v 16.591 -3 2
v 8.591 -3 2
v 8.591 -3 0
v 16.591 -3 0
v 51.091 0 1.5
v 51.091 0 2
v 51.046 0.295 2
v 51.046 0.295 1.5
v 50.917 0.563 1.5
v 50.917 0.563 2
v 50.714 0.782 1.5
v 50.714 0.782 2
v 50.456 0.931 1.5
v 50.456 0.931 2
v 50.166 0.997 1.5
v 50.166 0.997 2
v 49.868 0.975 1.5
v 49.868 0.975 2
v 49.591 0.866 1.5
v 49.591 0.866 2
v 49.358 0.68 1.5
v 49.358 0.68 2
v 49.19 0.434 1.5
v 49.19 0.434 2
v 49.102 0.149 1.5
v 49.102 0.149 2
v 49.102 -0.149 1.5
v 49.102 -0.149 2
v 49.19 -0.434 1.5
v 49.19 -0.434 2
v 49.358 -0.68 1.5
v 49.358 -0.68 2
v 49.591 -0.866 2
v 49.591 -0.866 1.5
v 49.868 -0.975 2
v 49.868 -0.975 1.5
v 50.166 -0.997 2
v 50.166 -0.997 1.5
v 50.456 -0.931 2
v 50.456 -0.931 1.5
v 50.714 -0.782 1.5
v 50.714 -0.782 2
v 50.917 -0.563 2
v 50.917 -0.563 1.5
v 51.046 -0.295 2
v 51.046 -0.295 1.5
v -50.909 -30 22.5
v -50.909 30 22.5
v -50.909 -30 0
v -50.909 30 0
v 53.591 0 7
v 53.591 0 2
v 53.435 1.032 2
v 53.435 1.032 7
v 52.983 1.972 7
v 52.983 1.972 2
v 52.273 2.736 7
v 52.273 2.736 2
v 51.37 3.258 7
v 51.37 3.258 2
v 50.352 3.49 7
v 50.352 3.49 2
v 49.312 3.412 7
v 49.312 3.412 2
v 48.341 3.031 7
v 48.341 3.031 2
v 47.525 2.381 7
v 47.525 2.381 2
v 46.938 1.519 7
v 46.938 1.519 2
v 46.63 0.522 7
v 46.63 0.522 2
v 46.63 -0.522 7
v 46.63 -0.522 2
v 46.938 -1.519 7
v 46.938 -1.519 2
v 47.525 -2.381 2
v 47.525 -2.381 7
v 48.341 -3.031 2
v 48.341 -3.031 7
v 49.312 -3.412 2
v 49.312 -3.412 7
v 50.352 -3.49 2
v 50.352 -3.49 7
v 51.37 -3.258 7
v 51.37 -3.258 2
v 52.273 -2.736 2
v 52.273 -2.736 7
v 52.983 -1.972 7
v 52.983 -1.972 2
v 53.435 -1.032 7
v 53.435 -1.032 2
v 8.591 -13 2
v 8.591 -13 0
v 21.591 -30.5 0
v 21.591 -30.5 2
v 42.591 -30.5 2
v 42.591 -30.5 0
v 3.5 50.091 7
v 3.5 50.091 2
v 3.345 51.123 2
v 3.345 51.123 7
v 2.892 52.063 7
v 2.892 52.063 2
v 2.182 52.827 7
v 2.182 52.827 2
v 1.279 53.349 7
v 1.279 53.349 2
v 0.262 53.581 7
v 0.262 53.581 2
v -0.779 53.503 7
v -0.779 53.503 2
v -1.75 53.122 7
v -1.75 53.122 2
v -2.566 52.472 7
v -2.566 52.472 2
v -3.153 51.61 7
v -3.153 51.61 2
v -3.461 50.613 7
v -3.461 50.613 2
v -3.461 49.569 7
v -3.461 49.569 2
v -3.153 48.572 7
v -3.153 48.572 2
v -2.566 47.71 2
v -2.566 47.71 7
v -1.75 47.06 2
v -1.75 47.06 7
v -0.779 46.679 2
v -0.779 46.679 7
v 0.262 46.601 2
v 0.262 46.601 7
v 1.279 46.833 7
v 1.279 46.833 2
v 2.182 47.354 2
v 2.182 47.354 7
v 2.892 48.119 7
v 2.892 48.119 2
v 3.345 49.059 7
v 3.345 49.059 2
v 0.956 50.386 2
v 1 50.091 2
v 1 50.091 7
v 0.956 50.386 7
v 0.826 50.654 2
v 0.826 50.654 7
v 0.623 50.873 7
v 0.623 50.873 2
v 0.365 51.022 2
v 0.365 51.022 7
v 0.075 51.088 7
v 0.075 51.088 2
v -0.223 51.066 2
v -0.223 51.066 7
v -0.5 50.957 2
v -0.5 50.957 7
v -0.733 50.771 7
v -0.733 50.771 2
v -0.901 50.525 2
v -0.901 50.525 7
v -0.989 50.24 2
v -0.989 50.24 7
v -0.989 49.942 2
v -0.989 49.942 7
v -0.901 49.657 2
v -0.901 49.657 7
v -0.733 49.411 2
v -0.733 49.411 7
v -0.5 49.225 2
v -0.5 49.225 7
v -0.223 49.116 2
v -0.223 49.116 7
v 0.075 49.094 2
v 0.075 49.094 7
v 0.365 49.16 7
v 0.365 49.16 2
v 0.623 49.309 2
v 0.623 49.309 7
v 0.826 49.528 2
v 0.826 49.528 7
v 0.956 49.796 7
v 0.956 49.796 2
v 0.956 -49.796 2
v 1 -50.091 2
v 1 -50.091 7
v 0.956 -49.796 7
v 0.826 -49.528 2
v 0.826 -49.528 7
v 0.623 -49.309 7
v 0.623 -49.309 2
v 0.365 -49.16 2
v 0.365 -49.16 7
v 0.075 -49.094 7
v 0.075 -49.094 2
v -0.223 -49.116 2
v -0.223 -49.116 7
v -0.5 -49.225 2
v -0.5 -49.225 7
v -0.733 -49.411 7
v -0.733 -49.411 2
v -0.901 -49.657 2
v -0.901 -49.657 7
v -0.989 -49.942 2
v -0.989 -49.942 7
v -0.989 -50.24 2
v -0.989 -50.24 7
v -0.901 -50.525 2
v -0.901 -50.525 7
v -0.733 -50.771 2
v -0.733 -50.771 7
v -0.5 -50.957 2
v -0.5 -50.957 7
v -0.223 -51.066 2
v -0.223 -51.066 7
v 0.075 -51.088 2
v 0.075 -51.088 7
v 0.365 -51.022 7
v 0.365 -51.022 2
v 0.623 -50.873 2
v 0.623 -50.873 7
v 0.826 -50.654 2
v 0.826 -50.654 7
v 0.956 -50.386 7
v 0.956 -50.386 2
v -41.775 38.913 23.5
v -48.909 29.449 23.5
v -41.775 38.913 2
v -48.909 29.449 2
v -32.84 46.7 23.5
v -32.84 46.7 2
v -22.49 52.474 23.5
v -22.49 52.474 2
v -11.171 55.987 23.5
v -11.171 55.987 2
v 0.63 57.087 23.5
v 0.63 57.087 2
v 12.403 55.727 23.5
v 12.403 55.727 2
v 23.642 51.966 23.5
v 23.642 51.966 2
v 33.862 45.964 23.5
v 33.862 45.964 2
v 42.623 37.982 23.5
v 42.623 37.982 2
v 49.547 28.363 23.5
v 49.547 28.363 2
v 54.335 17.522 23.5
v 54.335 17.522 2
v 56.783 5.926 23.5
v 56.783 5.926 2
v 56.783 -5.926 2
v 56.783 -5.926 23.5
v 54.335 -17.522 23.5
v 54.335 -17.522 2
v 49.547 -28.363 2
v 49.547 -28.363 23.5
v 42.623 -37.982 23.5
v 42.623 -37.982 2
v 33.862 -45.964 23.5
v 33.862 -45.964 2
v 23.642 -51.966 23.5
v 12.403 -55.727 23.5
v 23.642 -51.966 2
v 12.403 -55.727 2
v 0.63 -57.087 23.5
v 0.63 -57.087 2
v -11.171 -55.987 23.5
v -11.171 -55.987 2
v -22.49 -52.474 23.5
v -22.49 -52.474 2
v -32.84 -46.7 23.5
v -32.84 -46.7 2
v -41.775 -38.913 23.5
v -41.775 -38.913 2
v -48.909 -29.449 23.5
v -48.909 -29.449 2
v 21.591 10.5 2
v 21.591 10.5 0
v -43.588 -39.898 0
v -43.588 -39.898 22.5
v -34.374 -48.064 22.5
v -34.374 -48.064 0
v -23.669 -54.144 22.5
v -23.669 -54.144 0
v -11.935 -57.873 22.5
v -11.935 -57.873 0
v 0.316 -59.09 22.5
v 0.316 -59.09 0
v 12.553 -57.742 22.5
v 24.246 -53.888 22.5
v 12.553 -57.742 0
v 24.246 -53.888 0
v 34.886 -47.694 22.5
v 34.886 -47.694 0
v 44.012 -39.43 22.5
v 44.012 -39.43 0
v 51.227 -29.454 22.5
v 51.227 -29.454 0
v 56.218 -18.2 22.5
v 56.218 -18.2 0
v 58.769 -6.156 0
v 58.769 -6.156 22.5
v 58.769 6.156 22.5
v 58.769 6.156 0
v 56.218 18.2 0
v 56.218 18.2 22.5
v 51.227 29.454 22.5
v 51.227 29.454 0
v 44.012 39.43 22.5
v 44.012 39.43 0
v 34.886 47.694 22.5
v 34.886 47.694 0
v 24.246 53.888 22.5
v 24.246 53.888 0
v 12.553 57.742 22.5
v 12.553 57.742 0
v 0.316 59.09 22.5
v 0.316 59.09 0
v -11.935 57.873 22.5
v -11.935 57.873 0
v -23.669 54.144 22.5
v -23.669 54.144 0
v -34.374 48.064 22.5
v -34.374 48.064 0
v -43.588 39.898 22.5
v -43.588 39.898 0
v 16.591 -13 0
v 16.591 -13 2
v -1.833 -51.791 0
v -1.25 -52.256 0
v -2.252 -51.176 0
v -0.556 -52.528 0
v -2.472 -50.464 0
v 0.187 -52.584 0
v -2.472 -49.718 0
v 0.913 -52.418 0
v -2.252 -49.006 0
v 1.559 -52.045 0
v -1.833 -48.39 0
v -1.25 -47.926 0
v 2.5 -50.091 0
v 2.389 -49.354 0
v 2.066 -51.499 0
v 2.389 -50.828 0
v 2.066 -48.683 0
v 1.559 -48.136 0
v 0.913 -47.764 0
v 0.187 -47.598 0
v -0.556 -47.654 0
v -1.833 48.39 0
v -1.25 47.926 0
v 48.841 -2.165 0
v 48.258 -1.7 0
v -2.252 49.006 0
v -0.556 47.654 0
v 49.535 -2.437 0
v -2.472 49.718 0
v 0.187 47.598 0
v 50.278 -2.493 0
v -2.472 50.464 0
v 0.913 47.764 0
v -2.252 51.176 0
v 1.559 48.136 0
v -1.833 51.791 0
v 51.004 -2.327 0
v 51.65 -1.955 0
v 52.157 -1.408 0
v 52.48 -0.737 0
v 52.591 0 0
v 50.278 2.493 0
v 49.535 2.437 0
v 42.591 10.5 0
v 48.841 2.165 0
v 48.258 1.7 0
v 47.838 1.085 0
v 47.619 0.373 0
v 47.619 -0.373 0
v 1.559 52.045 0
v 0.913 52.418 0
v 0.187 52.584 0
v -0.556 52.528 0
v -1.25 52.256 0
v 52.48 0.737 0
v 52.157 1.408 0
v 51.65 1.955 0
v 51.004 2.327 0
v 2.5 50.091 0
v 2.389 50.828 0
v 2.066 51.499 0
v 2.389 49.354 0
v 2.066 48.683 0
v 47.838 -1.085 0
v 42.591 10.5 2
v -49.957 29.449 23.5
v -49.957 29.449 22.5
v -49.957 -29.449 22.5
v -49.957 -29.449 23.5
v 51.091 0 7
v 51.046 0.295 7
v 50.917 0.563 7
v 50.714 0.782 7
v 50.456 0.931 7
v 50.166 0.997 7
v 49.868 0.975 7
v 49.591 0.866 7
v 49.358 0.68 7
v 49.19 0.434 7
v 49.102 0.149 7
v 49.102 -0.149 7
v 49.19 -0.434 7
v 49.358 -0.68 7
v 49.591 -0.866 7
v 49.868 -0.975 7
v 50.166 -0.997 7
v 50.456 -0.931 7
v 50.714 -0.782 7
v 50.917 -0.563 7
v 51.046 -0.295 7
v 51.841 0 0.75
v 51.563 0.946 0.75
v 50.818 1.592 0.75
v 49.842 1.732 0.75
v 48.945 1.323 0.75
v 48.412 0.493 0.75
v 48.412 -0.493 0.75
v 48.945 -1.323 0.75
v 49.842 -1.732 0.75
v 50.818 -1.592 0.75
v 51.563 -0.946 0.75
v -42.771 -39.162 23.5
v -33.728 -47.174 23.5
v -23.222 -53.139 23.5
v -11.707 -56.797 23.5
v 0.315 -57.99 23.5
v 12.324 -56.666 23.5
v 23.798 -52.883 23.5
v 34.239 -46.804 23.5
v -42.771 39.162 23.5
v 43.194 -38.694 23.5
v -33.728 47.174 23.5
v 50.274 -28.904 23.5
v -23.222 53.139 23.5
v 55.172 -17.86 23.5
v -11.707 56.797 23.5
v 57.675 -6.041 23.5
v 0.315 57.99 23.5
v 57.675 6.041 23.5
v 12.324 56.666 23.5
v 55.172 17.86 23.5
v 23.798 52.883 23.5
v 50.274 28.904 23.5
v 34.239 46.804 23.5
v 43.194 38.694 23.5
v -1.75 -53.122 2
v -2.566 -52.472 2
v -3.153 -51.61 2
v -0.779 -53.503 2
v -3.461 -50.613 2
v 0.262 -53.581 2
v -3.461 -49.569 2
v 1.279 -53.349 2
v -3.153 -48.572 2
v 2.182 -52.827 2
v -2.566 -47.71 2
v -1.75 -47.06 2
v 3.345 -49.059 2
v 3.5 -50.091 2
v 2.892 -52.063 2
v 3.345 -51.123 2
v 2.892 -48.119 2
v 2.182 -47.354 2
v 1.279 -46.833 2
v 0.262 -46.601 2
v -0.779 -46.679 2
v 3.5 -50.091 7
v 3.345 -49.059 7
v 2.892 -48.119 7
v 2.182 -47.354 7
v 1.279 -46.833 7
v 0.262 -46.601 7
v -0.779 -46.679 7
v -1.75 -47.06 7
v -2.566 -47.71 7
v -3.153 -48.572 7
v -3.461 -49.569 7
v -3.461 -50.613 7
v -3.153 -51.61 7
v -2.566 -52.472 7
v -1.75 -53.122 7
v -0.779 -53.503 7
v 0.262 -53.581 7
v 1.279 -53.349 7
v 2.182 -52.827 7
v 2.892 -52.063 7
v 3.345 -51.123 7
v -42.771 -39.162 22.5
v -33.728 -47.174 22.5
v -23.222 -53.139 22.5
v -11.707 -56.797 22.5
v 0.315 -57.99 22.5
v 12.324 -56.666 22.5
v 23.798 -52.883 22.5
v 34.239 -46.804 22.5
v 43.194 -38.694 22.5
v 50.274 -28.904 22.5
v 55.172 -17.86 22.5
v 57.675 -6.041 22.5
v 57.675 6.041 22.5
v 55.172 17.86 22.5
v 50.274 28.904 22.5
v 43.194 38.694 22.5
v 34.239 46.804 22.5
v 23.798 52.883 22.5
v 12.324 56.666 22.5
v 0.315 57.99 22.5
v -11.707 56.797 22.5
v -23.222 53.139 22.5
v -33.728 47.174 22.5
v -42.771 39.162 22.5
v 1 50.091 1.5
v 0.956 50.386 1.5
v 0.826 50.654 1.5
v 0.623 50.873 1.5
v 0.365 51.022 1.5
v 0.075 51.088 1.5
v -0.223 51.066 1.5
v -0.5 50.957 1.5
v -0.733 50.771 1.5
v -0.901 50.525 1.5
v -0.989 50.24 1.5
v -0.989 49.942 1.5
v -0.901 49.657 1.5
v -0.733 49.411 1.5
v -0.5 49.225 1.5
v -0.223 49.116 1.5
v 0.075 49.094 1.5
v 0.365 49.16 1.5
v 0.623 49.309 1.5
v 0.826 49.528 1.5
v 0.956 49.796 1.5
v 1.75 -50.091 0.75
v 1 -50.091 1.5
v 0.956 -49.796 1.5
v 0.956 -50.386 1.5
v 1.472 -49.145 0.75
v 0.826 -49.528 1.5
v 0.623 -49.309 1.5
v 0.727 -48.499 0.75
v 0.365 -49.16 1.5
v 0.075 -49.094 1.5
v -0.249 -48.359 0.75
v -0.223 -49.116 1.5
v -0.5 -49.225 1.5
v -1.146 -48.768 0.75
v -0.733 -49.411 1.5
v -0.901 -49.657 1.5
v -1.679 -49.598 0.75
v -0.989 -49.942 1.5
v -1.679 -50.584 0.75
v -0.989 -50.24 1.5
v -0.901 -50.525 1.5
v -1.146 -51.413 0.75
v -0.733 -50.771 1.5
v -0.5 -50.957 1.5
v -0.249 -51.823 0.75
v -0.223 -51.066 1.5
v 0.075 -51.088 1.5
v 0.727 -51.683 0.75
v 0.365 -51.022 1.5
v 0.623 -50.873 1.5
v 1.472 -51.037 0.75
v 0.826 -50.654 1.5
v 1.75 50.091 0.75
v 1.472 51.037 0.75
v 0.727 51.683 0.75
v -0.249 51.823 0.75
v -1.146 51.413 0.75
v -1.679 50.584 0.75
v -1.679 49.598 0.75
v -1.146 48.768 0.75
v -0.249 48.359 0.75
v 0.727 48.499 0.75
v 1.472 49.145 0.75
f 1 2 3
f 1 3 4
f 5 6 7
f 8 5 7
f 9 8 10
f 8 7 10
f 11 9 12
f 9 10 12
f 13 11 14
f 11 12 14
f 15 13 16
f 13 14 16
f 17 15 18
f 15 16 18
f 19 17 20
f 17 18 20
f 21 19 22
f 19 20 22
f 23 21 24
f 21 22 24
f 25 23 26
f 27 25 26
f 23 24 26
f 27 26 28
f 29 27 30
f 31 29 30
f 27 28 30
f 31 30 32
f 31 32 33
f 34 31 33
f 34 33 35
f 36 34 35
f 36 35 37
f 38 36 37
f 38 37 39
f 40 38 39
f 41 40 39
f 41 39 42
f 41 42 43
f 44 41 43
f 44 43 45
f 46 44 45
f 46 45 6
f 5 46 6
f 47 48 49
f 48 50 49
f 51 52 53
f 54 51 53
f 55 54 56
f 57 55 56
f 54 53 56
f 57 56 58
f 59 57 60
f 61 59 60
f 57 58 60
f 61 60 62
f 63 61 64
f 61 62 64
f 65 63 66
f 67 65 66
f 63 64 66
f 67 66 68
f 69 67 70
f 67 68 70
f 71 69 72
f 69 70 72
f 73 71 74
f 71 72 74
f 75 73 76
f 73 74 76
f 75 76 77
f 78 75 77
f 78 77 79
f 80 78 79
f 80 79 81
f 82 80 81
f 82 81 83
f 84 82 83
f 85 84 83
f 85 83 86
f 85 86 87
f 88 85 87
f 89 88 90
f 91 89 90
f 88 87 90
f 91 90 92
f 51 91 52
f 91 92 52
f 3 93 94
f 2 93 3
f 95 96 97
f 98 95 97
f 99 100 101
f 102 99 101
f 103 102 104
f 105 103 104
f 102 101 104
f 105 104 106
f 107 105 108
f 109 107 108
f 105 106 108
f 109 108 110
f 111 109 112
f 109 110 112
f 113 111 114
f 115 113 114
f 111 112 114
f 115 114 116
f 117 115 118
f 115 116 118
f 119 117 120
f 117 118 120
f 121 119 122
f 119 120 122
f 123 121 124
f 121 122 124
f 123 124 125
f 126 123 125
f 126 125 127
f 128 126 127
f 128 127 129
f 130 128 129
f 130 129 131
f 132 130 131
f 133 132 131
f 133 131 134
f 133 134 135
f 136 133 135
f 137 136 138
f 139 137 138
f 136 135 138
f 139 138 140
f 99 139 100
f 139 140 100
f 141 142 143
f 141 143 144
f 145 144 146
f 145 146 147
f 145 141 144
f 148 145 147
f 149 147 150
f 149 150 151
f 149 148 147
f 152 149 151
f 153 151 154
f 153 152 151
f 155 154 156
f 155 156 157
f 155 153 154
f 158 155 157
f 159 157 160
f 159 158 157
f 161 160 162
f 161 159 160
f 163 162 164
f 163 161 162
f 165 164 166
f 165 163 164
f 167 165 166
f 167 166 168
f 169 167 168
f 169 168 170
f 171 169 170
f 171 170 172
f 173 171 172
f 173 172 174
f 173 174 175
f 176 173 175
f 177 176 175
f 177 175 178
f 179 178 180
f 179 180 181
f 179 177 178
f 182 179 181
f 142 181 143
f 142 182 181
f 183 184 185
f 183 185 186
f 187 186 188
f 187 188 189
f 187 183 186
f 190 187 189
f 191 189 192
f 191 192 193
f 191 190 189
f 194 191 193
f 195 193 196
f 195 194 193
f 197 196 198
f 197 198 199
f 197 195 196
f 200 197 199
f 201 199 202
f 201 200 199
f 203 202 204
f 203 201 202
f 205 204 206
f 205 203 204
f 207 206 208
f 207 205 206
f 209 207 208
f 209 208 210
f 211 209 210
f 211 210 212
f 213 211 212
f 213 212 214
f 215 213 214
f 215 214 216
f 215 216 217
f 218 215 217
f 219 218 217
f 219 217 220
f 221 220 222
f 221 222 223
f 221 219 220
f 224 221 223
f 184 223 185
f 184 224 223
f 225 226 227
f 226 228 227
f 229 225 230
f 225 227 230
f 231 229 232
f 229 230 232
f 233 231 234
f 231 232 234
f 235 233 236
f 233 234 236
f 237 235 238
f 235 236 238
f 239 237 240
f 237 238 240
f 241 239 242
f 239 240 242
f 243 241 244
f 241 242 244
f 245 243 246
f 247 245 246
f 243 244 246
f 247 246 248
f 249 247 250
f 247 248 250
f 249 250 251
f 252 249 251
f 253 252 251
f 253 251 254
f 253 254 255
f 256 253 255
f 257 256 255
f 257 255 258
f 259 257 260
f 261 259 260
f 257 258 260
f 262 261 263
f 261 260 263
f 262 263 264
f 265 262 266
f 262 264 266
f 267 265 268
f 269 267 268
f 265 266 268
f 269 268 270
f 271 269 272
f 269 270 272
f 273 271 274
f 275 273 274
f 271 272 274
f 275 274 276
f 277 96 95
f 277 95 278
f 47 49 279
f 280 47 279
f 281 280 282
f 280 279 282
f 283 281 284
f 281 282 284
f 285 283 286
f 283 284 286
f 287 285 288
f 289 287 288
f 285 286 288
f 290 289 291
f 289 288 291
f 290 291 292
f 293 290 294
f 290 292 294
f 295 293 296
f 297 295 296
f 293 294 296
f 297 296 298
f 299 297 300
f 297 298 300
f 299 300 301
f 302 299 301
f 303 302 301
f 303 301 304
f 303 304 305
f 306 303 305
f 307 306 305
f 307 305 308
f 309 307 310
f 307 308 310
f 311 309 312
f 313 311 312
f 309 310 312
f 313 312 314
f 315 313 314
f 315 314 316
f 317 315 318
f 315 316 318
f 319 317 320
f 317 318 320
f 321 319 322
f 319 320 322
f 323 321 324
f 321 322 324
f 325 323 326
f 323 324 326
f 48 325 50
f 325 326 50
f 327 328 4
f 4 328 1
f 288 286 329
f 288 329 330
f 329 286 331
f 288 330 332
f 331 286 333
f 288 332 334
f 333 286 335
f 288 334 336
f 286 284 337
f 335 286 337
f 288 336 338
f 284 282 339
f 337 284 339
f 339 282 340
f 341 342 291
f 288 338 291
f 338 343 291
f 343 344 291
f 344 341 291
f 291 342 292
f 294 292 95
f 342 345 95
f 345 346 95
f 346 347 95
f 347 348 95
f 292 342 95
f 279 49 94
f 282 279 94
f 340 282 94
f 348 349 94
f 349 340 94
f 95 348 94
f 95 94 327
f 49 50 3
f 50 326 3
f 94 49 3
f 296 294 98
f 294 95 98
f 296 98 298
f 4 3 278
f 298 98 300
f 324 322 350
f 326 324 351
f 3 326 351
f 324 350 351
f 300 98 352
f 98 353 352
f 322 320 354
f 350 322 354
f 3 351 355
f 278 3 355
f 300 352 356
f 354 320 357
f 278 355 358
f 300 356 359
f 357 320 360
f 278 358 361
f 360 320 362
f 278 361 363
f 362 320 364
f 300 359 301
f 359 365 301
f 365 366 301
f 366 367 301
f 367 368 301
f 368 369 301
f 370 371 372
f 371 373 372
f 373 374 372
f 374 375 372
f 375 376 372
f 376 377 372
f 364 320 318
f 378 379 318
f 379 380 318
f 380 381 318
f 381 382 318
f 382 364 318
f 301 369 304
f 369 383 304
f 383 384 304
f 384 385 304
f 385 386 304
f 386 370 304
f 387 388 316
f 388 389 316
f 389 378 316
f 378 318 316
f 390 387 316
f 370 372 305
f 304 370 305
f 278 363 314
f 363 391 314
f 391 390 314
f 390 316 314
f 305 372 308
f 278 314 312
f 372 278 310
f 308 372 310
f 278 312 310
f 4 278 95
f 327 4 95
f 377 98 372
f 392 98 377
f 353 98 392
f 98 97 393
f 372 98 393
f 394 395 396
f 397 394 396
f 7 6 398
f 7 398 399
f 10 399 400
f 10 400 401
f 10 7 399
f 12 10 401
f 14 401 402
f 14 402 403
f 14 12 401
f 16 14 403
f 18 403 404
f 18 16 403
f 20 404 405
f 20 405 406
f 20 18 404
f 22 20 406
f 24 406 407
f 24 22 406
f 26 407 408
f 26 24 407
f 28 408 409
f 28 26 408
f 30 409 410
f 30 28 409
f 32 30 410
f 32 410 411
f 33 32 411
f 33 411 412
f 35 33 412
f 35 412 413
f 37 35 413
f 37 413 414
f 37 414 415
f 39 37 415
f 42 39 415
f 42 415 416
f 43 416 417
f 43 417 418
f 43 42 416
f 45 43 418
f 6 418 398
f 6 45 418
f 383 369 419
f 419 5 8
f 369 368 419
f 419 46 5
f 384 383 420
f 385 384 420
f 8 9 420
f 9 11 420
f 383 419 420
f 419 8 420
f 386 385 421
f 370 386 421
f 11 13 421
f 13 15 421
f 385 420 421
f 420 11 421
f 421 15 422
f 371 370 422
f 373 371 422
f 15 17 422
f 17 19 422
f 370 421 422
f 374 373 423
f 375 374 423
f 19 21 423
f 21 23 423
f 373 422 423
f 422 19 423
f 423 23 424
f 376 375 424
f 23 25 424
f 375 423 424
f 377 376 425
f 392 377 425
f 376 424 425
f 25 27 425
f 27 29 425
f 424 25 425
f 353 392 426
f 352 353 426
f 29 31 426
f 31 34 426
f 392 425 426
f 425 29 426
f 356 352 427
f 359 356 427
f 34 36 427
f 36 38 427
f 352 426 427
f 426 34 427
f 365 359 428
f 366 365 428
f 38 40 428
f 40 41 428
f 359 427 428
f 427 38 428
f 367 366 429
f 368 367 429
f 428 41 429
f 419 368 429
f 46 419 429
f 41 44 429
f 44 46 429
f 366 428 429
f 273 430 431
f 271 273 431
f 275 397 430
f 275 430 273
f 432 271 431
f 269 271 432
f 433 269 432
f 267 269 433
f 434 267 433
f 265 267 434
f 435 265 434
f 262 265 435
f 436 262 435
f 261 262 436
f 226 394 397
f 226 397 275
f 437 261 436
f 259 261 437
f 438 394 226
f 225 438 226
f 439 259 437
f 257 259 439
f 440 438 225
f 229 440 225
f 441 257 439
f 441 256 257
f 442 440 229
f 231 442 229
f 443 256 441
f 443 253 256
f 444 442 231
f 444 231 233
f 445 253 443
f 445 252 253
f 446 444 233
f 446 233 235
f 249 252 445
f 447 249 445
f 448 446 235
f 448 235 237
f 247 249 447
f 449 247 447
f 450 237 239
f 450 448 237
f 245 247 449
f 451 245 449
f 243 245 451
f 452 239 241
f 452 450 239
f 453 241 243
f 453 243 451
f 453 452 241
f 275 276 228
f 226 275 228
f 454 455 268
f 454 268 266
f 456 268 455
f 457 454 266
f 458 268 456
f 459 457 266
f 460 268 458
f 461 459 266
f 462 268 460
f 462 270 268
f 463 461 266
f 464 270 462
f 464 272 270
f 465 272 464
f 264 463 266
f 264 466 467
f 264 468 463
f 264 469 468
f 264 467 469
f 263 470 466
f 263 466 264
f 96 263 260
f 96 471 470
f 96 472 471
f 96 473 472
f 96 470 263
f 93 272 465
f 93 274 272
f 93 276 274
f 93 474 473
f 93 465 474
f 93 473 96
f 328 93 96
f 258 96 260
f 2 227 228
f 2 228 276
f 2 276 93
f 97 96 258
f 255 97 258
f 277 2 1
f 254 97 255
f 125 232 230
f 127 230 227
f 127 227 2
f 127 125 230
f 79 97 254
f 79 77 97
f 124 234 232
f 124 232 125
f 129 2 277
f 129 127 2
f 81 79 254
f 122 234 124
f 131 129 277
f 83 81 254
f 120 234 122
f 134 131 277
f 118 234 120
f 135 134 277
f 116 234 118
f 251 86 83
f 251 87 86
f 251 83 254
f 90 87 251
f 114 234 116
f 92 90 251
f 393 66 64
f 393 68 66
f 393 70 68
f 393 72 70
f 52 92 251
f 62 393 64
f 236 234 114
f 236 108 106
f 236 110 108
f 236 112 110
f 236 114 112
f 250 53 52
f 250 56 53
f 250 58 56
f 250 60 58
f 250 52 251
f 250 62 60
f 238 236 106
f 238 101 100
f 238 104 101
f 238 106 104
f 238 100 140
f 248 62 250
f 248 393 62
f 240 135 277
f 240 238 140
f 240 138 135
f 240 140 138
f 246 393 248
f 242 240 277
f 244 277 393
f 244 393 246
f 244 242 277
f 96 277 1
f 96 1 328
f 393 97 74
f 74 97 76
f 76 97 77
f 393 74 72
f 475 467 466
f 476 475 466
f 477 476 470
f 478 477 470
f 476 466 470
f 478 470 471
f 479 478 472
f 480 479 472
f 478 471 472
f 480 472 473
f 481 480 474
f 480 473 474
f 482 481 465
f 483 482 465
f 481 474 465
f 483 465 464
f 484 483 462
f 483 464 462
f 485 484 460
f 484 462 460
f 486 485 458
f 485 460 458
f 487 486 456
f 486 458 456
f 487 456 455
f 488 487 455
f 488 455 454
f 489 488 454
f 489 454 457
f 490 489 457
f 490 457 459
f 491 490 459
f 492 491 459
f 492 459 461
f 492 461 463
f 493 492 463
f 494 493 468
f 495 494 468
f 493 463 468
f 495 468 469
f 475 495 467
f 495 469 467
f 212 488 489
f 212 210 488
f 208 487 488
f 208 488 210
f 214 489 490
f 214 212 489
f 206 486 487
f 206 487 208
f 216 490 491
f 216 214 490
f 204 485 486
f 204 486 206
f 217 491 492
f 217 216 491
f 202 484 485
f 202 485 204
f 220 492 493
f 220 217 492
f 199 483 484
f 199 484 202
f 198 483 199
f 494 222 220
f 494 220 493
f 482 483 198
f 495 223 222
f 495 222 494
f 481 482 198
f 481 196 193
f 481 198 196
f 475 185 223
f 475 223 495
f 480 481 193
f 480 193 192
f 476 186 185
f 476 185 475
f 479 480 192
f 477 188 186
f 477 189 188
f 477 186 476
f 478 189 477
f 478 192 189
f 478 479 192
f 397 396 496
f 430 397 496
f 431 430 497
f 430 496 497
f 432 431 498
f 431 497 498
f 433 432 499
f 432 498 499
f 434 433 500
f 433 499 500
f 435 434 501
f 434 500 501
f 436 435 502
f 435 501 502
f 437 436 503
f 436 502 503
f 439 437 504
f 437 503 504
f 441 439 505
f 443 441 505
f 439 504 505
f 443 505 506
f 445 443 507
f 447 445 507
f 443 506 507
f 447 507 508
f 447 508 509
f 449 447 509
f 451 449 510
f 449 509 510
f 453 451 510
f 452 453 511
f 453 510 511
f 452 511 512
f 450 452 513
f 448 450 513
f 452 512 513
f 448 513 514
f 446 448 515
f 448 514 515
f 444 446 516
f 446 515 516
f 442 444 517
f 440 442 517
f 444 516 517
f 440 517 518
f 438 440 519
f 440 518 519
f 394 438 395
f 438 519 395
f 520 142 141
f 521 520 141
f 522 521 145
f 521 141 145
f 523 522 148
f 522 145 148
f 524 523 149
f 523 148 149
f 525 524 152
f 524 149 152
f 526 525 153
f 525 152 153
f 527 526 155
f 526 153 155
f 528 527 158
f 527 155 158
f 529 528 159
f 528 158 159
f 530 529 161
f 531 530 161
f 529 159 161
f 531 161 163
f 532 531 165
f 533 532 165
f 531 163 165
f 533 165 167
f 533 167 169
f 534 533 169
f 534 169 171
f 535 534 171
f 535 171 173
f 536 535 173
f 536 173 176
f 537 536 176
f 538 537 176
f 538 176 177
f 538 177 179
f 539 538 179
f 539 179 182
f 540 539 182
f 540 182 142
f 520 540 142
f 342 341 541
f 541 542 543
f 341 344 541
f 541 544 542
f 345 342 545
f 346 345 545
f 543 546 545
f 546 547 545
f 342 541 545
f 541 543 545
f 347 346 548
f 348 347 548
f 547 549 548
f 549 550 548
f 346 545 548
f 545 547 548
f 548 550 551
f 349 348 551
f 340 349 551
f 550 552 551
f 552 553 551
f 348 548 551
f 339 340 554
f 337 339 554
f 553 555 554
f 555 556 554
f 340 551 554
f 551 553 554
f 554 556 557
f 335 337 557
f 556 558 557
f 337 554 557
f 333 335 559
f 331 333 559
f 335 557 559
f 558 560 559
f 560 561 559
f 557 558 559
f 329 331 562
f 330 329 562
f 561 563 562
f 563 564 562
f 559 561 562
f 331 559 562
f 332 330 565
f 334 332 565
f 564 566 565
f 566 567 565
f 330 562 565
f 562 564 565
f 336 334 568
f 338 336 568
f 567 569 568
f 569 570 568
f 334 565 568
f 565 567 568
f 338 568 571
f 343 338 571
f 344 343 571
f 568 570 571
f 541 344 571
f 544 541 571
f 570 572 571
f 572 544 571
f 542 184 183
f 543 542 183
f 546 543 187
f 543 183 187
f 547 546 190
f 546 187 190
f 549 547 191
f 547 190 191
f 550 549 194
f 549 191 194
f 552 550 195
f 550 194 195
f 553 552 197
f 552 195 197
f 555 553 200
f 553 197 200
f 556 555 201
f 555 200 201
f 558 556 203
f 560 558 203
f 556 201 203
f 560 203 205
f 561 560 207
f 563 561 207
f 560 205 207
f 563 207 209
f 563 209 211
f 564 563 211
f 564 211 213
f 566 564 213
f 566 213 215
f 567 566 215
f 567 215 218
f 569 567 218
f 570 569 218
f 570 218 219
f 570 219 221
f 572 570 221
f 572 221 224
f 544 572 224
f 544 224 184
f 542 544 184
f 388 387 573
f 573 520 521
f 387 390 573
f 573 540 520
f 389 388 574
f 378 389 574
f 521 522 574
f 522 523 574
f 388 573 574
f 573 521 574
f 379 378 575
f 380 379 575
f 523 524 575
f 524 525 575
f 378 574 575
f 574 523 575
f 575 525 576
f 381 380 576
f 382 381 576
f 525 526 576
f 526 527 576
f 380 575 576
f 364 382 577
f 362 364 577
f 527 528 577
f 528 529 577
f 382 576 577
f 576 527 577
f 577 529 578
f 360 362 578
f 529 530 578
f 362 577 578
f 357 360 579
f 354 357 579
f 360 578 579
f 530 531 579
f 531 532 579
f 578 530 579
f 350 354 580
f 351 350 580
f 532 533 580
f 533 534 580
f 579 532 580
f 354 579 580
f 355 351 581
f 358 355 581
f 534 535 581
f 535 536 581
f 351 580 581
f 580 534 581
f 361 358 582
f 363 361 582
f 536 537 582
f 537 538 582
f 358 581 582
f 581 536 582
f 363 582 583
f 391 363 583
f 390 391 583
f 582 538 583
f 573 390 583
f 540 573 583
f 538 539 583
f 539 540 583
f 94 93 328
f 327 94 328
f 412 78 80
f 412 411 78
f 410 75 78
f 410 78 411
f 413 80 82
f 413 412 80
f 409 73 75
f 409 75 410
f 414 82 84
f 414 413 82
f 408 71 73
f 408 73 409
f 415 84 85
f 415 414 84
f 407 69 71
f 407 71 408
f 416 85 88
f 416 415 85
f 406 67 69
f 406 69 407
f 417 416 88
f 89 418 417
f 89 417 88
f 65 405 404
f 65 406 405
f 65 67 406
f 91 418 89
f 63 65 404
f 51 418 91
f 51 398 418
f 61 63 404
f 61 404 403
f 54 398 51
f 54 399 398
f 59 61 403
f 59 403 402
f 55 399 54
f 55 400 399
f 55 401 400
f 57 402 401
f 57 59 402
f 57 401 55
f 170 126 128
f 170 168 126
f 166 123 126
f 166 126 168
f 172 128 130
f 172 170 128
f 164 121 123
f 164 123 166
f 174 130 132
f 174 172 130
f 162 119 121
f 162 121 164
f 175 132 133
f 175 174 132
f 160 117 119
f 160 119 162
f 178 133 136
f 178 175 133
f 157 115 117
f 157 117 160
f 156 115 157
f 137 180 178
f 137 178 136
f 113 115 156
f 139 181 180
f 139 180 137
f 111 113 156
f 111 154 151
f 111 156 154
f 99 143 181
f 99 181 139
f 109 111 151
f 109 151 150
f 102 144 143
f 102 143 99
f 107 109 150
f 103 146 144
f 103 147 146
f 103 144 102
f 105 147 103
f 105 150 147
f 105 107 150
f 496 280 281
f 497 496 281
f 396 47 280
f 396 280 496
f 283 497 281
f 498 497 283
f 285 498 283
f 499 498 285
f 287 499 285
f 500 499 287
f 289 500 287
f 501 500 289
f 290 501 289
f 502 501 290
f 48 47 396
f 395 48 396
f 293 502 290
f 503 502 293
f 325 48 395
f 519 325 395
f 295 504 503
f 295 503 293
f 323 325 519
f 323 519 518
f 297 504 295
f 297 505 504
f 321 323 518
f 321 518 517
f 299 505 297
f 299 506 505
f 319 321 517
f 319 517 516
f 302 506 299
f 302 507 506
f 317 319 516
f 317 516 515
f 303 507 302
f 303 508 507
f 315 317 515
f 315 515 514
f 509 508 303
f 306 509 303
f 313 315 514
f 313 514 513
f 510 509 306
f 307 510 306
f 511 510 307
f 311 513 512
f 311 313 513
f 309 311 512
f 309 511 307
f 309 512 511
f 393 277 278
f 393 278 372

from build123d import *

# Parameters (mm, degrees)
F1_DEPTH  = 2
F3_R      = 3.5
F3_R_2    = 1
F5_DEPTH  = 5
F2_W      = 2
F2_H      = 13
F2_H_2    = 18.4
F2_H_3    = 10
F6_DEPTH  = 20.5
F8_DEPTH  = 1
F4_W      = 21
F4_H      = 41
F9_DEPTH  = 25
F10_DEPTH = 25
F11_SIZE2 = 1.5
F11_SIZE  = 1.5
F4_W_2    = 8
F4_H_2    = 10
F12_DEPTH = 25


with BuildPart() as f1:
    # F0 (on Top) → F1 (new body)
    with BuildSketch(Plane.XY):
        with BuildLine():
            Line((-50.9090909091, 30), (-50.9090909091, -30))
            ThreePointArc((-50.9090909091, -30), (59.0909090909, 0), (-50.9090909091, 30))
        make_face()
    extrude(amount=F1_DEPTH)

    # F3 (on face) → F5 (join)
    with BuildSketch(Plane.XY.offset(2)):
        with Locations((0, -50.0909090909)):
            Circle(F3_R)
        with Locations((0, -50.0909090909)):
            Circle(F3_R_2, mode=Mode.SUBTRACT)
        with Locations((0, 50.0909090909)):
            Circle(F3_R)
        with Locations((0, 50.0909090909)):
            Circle(F3_R_2, mode=Mode.SUBTRACT)
        with Locations((50.0909090909, 0)):
            Circle(F3_R)
        with Locations((50.0909090909, 0)):
            Circle(F3_R_2, mode=Mode.SUBTRACT)
    extrude(amount=F5_DEPTH)

    # F2 (on face) → F6 (join)
    with BuildSketch(Plane.XY.offset(2)):
        with BuildLine():
            ThreePointArc((-48.9090909091, 29.4494945164), (57.0909090909, 0), (-48.9090909091, -29.4494945164))
            Line((-48.9090909091, -29.4494945164), (-48.9090909091, -22.0505054836))
            Line((-48.9090909091, -22.0505054836), (-50.9090909091, -22.0505054836))
            Line((-50.9090909091, -22.0505054836), (-50.9090909091, -30))
            ThreePointArc((-50.9090909091, -30), (59.0909090909, 0), (-50.9090909091, 30))
            Line((-50.9090909091, 30), (-50.9090909091, 19.3494945164))
            Line((-50.9090909091, 19.3494945164), (-48.9090909091, 19.3494945164))
            Line((-48.9090909091, 19.3494945164), (-48.9090909091, 29.4494945164))
        make_face()
        with Locations((-49.9090909091, 12.8494945164)):
            Rectangle(F2_W, F2_H)
        with Locations((-49.9090909091, -2.8505054836)):
            Rectangle(F2_W, F2_H_2)
        with Locations((-49.9090909091, -17.0505054836)):
            Rectangle(F2_W, F2_H_3)
    extrude(amount=F6_DEPTH)

    # F7 (on face) → F8 (join)
    with BuildSketch(Plane.XY.offset(22.5)):
        with BuildLine():
            Line((-49.9567093584, 29.4494945164), (-49.9567093584, -29.4494945164))
            ThreePointArc((-49.9567093584, -29.4494945164), (57.9909090909, 0), (-49.9567093584, 29.4494945164))
        make_face()
        with BuildLine():
            ThreePointArc((-48.9090909091, 29.4494945164), (57.0909090909, 0), (-48.9090909091, -29.4494945164))
            Line((-48.9090909091, -29.4494945164), (-48.9090909091, 29.4494945164))
        make_face(mode=Mode.SUBTRACT)
    extrude(amount=F8_DEPTH)

    # F4 (on face) → F9 (cut)
    with BuildSketch(Plane.XY.offset(2)):
        with Locations((32.0909090909, -10)):
            Rectangle(F4_W, F4_H)
    extrude(amount=-F9_DEPTH, mode=Mode.SUBTRACT)

    # F3 (on face) → F10 (cut)
    with BuildSketch(Plane.XY.offset(2)):
        with Locations((0, 50.0909090909)):
            Circle(F3_R_2)
        with Locations((50.0909090909, 0)):
            Circle(F3_R_2)
        with Locations((0, -50.0909090909)):
            Circle(F3_R_2)
    extrude(amount=-F10_DEPTH, mode=Mode.SUBTRACT)

    # F11
    f11_edges = [f1.edges().sort_by_distance(p)[0] for p in [
        (-1, -50.090909, 0),
        (49.090909, 0, 0),
        (-1, 50.090909, 0),
    ]]
    chamfer(f11_edges, length=F11_SIZE, length2=F11_SIZE2)

    # F4 (on face) → F12 (cut)
    with BuildSketch(Plane.XY.offset(2)):
        with Locations((12.5909090909, -8)):
            Rectangle(F4_W_2, F4_H_2)
    extrude(amount=-F12_DEPTH, mode=Mode.SUBTRACT)


solid = f1.part
